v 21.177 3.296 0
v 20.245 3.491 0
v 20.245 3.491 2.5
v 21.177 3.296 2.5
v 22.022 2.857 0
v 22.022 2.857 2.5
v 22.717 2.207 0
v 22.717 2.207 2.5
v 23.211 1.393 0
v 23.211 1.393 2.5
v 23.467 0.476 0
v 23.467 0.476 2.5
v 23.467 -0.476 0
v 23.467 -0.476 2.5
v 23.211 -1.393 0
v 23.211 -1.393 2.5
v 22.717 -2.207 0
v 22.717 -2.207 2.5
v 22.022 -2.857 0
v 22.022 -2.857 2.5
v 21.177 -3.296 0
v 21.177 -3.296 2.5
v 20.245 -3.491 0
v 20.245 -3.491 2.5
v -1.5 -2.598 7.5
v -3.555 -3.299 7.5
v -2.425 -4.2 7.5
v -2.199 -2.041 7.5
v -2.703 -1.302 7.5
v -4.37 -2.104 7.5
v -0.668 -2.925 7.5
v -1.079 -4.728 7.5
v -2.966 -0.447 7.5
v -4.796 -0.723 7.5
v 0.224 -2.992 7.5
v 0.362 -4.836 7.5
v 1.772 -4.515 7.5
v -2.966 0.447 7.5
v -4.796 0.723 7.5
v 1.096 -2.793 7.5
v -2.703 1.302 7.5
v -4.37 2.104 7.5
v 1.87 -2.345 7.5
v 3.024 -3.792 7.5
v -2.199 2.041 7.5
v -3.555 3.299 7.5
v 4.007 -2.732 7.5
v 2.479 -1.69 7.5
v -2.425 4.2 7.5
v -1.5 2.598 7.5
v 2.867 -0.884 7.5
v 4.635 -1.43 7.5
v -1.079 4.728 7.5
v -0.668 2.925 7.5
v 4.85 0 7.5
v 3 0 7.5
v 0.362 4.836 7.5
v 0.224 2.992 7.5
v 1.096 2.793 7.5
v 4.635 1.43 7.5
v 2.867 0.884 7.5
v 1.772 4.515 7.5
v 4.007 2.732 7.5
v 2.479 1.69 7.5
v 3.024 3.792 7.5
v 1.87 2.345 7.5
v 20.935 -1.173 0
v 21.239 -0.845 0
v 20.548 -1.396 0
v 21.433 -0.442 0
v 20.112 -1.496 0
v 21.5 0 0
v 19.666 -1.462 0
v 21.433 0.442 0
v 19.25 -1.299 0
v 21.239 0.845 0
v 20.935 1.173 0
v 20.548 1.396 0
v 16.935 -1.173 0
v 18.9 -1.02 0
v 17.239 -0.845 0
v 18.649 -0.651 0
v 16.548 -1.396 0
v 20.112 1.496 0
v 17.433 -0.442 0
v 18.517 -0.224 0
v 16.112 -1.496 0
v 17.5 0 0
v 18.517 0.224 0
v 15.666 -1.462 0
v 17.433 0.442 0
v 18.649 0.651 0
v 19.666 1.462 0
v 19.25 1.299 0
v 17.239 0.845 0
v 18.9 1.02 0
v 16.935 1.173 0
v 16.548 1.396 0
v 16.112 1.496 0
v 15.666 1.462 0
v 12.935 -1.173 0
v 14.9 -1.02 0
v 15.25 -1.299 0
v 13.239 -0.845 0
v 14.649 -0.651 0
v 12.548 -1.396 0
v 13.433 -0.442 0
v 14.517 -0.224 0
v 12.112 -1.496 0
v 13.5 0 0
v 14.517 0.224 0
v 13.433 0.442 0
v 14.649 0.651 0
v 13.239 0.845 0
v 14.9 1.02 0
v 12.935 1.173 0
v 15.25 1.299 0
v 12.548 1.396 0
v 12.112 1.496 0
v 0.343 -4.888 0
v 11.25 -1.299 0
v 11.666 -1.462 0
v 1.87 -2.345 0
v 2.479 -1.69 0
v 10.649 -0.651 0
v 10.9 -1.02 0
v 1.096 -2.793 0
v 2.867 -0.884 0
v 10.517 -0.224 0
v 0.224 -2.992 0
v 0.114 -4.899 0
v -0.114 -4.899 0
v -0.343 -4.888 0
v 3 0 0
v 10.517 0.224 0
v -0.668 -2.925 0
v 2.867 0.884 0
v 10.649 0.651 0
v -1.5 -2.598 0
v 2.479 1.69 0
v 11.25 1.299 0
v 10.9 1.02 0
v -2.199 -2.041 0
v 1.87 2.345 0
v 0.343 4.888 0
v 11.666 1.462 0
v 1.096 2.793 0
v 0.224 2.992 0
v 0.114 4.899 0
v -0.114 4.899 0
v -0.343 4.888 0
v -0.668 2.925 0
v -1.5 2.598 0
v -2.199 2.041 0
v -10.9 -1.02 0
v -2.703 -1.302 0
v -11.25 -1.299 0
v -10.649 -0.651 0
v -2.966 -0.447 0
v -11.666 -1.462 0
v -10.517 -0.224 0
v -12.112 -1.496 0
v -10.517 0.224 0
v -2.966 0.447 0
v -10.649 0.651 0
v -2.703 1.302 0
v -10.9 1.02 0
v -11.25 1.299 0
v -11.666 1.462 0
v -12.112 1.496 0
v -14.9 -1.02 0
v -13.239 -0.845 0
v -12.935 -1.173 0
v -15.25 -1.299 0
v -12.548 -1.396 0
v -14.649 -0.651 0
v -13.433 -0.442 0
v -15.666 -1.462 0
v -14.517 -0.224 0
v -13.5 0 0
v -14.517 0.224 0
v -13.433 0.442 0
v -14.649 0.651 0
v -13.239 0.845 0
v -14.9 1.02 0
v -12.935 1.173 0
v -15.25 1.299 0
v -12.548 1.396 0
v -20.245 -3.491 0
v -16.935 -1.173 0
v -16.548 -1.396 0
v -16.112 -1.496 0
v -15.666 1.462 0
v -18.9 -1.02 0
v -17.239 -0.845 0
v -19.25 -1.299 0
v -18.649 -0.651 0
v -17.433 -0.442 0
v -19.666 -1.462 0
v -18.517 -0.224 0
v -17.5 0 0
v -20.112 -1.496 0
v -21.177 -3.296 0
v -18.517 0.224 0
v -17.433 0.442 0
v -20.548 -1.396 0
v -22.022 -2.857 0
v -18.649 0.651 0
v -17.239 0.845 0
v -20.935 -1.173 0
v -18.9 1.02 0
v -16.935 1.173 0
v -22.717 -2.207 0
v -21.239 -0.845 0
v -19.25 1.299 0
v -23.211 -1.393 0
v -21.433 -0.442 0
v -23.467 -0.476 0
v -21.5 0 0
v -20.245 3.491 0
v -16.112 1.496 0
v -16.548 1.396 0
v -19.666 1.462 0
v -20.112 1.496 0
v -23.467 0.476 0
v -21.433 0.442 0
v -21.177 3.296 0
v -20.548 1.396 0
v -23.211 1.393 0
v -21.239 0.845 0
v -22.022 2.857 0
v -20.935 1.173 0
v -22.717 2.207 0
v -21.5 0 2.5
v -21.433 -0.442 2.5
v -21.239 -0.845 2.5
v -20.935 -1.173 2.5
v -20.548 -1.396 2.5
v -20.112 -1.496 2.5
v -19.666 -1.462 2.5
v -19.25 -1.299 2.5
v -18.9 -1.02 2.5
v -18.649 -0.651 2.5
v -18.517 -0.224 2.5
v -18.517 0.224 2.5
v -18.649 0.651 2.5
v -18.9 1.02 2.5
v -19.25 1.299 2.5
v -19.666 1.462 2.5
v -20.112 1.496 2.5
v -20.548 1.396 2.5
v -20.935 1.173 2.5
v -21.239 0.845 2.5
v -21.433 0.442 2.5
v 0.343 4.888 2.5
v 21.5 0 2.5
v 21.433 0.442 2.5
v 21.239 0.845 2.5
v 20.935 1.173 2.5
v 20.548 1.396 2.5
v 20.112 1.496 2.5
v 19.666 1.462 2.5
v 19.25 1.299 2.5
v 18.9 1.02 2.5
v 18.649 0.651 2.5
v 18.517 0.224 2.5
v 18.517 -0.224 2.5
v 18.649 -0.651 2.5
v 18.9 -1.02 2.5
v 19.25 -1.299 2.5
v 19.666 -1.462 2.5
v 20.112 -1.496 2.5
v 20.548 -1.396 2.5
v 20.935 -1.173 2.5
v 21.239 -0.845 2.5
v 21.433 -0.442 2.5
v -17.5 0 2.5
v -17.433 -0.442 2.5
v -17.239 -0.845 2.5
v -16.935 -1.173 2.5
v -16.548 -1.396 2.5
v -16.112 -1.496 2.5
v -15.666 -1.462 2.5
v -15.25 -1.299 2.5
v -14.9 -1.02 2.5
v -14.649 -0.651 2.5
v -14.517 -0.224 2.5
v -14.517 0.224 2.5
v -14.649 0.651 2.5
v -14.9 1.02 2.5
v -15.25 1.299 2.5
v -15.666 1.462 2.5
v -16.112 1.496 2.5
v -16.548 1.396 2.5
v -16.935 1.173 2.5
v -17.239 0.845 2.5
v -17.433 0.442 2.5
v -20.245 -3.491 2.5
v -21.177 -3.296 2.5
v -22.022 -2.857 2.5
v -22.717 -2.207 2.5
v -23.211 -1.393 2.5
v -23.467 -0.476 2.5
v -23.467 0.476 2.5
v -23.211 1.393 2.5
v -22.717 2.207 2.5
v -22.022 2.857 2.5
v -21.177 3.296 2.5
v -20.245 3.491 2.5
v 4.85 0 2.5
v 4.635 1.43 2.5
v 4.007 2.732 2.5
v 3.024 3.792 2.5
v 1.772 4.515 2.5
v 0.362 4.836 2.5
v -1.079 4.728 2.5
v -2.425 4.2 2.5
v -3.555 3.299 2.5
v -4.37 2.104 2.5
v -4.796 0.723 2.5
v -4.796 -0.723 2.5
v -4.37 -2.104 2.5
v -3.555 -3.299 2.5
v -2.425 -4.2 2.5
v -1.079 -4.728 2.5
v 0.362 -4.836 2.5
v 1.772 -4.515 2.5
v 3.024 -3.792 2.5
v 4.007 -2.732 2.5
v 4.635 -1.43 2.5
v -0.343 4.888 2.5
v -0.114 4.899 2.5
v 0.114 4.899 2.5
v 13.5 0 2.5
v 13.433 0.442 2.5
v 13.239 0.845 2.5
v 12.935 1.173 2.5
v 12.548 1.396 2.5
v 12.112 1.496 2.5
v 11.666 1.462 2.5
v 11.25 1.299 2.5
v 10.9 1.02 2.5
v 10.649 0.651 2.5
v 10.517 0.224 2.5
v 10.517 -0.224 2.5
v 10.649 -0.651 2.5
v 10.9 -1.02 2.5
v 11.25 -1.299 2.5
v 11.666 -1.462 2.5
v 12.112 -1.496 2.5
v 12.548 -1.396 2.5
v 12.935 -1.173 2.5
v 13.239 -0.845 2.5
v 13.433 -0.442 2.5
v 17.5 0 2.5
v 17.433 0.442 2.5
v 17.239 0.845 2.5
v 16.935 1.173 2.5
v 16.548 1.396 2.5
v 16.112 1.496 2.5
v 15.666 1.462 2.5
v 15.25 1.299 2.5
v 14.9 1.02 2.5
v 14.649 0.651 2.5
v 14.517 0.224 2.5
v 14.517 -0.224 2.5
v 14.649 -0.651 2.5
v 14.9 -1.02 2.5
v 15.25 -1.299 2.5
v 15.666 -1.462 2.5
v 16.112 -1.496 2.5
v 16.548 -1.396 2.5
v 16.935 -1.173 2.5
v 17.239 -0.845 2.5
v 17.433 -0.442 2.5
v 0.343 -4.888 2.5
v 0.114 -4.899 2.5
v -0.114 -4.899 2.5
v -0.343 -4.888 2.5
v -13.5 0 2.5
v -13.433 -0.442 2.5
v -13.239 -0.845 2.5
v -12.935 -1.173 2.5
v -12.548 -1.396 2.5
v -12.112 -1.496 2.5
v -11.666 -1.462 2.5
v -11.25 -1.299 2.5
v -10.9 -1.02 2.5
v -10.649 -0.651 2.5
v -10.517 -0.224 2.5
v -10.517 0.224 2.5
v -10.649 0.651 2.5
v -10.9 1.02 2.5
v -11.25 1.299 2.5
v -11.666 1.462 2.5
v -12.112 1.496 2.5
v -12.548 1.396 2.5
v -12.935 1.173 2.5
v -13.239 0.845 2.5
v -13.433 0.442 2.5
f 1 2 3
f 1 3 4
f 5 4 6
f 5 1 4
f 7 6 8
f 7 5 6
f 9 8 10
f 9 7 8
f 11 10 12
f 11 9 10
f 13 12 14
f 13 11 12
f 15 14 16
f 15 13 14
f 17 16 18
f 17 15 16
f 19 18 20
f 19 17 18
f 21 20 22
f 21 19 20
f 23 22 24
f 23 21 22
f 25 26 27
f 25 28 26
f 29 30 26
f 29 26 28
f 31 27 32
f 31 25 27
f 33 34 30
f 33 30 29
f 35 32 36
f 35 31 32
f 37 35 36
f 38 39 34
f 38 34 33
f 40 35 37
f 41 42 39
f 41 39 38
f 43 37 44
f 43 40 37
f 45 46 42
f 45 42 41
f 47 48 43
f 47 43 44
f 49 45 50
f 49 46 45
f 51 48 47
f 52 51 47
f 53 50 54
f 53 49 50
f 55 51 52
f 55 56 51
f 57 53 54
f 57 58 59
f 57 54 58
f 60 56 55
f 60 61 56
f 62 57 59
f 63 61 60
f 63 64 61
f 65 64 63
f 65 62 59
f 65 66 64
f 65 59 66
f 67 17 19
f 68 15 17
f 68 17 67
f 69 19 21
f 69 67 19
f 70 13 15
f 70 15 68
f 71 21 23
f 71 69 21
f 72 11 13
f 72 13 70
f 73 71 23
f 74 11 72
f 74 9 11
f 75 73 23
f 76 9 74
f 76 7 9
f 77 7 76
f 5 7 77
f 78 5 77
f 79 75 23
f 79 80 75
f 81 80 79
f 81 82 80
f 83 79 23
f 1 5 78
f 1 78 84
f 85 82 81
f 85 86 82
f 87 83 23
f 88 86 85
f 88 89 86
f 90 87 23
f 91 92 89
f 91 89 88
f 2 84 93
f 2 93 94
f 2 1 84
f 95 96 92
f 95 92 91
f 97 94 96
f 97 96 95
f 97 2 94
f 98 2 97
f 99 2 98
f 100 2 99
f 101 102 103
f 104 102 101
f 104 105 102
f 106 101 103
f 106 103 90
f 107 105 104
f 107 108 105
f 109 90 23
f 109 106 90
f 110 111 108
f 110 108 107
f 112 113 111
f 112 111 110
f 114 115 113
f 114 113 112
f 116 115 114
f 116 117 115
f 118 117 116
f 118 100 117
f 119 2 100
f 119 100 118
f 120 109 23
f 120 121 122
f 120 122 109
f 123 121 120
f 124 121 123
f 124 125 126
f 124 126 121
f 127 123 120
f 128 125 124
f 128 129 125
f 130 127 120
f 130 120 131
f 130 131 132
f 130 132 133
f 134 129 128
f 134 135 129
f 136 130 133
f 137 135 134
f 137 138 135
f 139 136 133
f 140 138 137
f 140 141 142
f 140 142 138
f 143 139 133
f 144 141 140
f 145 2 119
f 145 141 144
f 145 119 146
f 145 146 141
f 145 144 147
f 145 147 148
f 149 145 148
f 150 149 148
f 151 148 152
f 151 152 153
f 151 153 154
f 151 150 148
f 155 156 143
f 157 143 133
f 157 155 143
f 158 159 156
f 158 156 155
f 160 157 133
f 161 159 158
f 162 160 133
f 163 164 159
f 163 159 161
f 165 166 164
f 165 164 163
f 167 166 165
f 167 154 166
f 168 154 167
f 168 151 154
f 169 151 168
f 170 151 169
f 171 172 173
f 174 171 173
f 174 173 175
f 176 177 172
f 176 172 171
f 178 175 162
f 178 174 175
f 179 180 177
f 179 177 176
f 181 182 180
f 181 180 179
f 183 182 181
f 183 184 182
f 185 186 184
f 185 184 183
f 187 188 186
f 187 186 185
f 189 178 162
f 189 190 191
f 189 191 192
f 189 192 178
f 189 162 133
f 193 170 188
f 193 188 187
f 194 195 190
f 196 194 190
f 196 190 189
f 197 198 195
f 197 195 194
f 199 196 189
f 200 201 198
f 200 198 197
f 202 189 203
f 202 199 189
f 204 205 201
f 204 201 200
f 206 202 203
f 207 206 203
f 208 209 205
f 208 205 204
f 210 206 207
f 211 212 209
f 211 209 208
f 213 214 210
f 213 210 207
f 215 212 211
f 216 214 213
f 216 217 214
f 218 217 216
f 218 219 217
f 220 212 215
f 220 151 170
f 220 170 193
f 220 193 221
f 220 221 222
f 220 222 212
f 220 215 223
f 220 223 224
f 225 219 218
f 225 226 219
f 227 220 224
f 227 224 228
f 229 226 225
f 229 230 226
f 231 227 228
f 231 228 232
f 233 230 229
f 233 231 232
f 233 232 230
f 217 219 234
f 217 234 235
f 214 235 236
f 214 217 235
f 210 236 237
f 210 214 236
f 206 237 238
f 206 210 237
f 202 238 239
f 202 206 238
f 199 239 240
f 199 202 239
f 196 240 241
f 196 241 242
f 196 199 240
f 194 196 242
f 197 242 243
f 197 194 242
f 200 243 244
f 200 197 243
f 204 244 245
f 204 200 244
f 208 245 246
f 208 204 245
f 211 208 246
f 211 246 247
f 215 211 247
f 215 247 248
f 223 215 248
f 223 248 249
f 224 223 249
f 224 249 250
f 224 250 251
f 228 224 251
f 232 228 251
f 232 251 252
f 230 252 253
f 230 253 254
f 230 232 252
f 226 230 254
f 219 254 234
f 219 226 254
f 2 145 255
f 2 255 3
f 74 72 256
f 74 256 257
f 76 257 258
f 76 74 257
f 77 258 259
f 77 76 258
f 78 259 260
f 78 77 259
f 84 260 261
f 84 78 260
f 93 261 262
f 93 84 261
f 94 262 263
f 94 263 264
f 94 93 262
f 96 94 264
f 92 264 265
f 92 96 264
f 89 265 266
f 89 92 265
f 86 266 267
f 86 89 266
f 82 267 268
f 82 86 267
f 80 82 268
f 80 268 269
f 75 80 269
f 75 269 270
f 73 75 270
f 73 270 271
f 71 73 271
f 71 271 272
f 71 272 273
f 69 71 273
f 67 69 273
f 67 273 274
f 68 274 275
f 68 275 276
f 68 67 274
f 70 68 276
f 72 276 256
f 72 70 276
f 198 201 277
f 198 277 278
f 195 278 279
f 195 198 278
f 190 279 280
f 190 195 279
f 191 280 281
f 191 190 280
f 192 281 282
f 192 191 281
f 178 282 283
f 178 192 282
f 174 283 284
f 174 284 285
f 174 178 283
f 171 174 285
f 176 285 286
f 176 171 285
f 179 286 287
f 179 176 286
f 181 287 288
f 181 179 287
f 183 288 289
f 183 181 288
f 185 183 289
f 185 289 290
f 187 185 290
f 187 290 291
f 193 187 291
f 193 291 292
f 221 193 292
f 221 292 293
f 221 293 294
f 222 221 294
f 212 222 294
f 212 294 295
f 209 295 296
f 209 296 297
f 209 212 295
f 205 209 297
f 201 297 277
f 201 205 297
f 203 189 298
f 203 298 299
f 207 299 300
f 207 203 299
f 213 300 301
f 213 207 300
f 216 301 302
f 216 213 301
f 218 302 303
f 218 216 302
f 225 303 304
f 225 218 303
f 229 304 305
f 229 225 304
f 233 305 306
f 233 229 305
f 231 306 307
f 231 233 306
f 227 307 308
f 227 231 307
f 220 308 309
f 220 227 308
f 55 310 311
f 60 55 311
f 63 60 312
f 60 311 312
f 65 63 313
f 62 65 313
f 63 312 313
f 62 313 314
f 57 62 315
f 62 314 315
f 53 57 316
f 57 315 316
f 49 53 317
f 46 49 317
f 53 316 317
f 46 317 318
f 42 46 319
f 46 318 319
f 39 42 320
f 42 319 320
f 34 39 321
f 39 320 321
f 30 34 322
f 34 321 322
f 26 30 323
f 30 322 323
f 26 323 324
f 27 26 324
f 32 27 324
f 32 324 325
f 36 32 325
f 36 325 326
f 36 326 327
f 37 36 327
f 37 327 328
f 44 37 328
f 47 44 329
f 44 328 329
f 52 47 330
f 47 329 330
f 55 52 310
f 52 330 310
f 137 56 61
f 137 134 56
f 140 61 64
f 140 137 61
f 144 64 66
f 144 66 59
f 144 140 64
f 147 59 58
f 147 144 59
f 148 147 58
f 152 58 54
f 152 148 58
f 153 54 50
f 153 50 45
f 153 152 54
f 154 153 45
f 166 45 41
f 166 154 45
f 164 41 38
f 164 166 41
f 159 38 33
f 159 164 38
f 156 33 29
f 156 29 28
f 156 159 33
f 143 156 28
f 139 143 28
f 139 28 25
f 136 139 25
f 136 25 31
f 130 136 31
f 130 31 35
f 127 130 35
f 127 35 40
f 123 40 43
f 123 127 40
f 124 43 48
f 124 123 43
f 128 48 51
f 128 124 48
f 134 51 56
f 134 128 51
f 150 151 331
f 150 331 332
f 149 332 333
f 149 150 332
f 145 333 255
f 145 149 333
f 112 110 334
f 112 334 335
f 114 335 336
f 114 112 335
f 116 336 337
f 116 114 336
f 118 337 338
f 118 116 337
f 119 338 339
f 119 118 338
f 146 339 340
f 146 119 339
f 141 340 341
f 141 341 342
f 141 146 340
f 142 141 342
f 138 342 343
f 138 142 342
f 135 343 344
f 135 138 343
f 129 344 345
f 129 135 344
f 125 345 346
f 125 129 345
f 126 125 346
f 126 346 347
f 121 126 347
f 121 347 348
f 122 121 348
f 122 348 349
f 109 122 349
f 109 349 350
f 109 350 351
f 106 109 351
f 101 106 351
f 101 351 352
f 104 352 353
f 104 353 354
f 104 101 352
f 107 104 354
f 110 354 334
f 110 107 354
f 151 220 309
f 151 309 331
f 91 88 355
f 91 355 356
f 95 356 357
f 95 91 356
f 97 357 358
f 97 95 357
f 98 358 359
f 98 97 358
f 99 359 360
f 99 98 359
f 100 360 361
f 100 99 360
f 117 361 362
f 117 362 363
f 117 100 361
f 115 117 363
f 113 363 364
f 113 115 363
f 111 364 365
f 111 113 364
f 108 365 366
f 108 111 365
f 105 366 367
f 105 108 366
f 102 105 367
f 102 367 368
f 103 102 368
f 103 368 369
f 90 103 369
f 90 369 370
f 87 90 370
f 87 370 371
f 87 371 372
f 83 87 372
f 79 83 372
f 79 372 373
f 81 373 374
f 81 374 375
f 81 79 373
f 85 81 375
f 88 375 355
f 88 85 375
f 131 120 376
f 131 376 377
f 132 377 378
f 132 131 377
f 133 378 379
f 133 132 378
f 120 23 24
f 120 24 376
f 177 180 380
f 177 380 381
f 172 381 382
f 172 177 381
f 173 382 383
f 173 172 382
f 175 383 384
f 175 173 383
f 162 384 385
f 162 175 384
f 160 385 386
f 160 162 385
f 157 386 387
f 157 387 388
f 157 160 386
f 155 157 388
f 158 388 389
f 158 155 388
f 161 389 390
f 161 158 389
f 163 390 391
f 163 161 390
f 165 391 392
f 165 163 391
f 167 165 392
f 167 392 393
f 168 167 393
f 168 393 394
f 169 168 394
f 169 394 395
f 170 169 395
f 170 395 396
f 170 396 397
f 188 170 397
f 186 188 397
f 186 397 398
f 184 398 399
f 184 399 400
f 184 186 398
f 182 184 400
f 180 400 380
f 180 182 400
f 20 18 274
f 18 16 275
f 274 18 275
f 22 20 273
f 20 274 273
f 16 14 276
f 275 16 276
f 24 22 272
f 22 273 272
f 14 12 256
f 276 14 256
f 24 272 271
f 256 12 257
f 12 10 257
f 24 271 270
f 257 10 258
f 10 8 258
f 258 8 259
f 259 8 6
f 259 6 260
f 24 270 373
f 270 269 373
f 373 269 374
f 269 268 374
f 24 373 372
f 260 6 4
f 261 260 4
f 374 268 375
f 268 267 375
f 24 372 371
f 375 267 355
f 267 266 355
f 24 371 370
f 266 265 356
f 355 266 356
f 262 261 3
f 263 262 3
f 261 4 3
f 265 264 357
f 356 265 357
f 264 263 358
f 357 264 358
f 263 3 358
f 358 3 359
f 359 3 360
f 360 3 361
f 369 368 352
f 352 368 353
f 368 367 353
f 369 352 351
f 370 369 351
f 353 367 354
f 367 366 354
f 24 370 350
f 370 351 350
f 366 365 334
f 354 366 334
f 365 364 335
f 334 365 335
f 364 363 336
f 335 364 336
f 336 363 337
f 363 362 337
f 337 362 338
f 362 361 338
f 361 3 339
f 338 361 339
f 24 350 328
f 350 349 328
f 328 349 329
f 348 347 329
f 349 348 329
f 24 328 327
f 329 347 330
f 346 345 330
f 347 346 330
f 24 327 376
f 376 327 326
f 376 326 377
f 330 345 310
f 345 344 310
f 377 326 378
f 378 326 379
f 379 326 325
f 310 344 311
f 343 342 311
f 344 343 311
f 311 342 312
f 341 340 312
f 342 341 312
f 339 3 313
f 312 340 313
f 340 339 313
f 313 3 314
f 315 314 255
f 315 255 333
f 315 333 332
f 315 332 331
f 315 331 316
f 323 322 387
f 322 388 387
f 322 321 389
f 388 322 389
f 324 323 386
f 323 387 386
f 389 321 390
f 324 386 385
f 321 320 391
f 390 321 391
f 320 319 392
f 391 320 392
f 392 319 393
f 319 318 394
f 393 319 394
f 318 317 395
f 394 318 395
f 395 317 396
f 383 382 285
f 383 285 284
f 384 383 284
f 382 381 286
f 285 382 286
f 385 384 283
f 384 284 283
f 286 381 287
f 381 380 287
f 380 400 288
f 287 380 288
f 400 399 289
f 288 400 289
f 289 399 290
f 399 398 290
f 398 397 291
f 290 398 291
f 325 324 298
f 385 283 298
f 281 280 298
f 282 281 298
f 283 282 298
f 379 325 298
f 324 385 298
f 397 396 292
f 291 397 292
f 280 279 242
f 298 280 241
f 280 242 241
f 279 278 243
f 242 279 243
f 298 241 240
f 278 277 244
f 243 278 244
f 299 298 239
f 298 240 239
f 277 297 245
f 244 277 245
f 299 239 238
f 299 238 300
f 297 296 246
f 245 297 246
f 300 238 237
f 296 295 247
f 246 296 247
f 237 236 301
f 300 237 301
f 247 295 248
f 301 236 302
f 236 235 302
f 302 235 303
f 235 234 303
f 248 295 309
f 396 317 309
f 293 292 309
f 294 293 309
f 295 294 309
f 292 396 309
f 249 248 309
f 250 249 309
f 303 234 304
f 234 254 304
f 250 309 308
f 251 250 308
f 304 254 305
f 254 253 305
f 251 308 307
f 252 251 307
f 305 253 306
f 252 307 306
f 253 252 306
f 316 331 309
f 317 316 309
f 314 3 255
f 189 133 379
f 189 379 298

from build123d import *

# Parameters (mm, degrees)
SKETCH_1_R      = 1.5
SKETCH_1_R_2    = 3
EXTRUDE_1_DEPTH = 2.5
SKETCH_2_R      = 4.85
SKETCH_2_R_2    = 3
EXTRUDE_2_DEPTH = 5


with BuildPart() as part:
    # 草图1 → 凸台-拉伸1 (new body)
    with BuildSketch(Plane.XY):
        with BuildLine():
            Line((-0.343, -4.887980258), (-20.245, -3.49141447))
            ThreePointArc((-20.245, -3.49141447), (-23.5, 0), (-20.245, 3.49141447))
            Line((-20.245, 3.49141447), (-0.343, 4.887980258))
            ThreePointArc((-0.343, 4.887980258), (0, 4.9), (0.343, 4.887980258))
            Line((0.343, 4.887980258), (20.245, 3.49141447))
            ThreePointArc((20.245, 3.49141447), (23.5, 0), (20.245, -3.49141447))
            Line((20.245, -3.49141447), (0.343, -4.887980258))
            ThreePointArc((0.343, -4.887980258), (0, -4.9), (-0.343, -4.887980258))
        make_face()
        with Locations((20, 0)):
            Circle(SKETCH_1_R, mode=Mode.SUBTRACT)
        with Locations((16, 0)):
            Circle(SKETCH_1_R, mode=Mode.SUBTRACT)
        with Locations((12, 0)):
            Circle(SKETCH_1_R, mode=Mode.SUBTRACT)
        Circle(SKETCH_1_R_2, mode=Mode.SUBTRACT)
        with Locations(Location((-12, 0, 0), (0, 0, 180))):
            Circle(SKETCH_1_R, mode=Mode.SUBTRACT)
        with Locations(Location((-16, 0, 0), (0, 0, 180))):
            Circle(SKETCH_1_R, mode=Mode.SUBTRACT)
        with Locations(Location((-20, 0, 0), (0, 0, 180))):
            Circle(SKETCH_1_R, mode=Mode.SUBTRACT)
    extrude(amount=EXTRUDE_1_DEPTH)

    # 草图2 → 凸台-拉伸2 (add)
    with BuildSketch(Plane.XY.offset(2.5)):
        Circle(SKETCH_2_R)
        Circle(SKETCH_2_R_2, mode=Mode.SUBTRACT)
    extrude(amount=EXTRUDE_2_DEPTH)


solid = part.part
